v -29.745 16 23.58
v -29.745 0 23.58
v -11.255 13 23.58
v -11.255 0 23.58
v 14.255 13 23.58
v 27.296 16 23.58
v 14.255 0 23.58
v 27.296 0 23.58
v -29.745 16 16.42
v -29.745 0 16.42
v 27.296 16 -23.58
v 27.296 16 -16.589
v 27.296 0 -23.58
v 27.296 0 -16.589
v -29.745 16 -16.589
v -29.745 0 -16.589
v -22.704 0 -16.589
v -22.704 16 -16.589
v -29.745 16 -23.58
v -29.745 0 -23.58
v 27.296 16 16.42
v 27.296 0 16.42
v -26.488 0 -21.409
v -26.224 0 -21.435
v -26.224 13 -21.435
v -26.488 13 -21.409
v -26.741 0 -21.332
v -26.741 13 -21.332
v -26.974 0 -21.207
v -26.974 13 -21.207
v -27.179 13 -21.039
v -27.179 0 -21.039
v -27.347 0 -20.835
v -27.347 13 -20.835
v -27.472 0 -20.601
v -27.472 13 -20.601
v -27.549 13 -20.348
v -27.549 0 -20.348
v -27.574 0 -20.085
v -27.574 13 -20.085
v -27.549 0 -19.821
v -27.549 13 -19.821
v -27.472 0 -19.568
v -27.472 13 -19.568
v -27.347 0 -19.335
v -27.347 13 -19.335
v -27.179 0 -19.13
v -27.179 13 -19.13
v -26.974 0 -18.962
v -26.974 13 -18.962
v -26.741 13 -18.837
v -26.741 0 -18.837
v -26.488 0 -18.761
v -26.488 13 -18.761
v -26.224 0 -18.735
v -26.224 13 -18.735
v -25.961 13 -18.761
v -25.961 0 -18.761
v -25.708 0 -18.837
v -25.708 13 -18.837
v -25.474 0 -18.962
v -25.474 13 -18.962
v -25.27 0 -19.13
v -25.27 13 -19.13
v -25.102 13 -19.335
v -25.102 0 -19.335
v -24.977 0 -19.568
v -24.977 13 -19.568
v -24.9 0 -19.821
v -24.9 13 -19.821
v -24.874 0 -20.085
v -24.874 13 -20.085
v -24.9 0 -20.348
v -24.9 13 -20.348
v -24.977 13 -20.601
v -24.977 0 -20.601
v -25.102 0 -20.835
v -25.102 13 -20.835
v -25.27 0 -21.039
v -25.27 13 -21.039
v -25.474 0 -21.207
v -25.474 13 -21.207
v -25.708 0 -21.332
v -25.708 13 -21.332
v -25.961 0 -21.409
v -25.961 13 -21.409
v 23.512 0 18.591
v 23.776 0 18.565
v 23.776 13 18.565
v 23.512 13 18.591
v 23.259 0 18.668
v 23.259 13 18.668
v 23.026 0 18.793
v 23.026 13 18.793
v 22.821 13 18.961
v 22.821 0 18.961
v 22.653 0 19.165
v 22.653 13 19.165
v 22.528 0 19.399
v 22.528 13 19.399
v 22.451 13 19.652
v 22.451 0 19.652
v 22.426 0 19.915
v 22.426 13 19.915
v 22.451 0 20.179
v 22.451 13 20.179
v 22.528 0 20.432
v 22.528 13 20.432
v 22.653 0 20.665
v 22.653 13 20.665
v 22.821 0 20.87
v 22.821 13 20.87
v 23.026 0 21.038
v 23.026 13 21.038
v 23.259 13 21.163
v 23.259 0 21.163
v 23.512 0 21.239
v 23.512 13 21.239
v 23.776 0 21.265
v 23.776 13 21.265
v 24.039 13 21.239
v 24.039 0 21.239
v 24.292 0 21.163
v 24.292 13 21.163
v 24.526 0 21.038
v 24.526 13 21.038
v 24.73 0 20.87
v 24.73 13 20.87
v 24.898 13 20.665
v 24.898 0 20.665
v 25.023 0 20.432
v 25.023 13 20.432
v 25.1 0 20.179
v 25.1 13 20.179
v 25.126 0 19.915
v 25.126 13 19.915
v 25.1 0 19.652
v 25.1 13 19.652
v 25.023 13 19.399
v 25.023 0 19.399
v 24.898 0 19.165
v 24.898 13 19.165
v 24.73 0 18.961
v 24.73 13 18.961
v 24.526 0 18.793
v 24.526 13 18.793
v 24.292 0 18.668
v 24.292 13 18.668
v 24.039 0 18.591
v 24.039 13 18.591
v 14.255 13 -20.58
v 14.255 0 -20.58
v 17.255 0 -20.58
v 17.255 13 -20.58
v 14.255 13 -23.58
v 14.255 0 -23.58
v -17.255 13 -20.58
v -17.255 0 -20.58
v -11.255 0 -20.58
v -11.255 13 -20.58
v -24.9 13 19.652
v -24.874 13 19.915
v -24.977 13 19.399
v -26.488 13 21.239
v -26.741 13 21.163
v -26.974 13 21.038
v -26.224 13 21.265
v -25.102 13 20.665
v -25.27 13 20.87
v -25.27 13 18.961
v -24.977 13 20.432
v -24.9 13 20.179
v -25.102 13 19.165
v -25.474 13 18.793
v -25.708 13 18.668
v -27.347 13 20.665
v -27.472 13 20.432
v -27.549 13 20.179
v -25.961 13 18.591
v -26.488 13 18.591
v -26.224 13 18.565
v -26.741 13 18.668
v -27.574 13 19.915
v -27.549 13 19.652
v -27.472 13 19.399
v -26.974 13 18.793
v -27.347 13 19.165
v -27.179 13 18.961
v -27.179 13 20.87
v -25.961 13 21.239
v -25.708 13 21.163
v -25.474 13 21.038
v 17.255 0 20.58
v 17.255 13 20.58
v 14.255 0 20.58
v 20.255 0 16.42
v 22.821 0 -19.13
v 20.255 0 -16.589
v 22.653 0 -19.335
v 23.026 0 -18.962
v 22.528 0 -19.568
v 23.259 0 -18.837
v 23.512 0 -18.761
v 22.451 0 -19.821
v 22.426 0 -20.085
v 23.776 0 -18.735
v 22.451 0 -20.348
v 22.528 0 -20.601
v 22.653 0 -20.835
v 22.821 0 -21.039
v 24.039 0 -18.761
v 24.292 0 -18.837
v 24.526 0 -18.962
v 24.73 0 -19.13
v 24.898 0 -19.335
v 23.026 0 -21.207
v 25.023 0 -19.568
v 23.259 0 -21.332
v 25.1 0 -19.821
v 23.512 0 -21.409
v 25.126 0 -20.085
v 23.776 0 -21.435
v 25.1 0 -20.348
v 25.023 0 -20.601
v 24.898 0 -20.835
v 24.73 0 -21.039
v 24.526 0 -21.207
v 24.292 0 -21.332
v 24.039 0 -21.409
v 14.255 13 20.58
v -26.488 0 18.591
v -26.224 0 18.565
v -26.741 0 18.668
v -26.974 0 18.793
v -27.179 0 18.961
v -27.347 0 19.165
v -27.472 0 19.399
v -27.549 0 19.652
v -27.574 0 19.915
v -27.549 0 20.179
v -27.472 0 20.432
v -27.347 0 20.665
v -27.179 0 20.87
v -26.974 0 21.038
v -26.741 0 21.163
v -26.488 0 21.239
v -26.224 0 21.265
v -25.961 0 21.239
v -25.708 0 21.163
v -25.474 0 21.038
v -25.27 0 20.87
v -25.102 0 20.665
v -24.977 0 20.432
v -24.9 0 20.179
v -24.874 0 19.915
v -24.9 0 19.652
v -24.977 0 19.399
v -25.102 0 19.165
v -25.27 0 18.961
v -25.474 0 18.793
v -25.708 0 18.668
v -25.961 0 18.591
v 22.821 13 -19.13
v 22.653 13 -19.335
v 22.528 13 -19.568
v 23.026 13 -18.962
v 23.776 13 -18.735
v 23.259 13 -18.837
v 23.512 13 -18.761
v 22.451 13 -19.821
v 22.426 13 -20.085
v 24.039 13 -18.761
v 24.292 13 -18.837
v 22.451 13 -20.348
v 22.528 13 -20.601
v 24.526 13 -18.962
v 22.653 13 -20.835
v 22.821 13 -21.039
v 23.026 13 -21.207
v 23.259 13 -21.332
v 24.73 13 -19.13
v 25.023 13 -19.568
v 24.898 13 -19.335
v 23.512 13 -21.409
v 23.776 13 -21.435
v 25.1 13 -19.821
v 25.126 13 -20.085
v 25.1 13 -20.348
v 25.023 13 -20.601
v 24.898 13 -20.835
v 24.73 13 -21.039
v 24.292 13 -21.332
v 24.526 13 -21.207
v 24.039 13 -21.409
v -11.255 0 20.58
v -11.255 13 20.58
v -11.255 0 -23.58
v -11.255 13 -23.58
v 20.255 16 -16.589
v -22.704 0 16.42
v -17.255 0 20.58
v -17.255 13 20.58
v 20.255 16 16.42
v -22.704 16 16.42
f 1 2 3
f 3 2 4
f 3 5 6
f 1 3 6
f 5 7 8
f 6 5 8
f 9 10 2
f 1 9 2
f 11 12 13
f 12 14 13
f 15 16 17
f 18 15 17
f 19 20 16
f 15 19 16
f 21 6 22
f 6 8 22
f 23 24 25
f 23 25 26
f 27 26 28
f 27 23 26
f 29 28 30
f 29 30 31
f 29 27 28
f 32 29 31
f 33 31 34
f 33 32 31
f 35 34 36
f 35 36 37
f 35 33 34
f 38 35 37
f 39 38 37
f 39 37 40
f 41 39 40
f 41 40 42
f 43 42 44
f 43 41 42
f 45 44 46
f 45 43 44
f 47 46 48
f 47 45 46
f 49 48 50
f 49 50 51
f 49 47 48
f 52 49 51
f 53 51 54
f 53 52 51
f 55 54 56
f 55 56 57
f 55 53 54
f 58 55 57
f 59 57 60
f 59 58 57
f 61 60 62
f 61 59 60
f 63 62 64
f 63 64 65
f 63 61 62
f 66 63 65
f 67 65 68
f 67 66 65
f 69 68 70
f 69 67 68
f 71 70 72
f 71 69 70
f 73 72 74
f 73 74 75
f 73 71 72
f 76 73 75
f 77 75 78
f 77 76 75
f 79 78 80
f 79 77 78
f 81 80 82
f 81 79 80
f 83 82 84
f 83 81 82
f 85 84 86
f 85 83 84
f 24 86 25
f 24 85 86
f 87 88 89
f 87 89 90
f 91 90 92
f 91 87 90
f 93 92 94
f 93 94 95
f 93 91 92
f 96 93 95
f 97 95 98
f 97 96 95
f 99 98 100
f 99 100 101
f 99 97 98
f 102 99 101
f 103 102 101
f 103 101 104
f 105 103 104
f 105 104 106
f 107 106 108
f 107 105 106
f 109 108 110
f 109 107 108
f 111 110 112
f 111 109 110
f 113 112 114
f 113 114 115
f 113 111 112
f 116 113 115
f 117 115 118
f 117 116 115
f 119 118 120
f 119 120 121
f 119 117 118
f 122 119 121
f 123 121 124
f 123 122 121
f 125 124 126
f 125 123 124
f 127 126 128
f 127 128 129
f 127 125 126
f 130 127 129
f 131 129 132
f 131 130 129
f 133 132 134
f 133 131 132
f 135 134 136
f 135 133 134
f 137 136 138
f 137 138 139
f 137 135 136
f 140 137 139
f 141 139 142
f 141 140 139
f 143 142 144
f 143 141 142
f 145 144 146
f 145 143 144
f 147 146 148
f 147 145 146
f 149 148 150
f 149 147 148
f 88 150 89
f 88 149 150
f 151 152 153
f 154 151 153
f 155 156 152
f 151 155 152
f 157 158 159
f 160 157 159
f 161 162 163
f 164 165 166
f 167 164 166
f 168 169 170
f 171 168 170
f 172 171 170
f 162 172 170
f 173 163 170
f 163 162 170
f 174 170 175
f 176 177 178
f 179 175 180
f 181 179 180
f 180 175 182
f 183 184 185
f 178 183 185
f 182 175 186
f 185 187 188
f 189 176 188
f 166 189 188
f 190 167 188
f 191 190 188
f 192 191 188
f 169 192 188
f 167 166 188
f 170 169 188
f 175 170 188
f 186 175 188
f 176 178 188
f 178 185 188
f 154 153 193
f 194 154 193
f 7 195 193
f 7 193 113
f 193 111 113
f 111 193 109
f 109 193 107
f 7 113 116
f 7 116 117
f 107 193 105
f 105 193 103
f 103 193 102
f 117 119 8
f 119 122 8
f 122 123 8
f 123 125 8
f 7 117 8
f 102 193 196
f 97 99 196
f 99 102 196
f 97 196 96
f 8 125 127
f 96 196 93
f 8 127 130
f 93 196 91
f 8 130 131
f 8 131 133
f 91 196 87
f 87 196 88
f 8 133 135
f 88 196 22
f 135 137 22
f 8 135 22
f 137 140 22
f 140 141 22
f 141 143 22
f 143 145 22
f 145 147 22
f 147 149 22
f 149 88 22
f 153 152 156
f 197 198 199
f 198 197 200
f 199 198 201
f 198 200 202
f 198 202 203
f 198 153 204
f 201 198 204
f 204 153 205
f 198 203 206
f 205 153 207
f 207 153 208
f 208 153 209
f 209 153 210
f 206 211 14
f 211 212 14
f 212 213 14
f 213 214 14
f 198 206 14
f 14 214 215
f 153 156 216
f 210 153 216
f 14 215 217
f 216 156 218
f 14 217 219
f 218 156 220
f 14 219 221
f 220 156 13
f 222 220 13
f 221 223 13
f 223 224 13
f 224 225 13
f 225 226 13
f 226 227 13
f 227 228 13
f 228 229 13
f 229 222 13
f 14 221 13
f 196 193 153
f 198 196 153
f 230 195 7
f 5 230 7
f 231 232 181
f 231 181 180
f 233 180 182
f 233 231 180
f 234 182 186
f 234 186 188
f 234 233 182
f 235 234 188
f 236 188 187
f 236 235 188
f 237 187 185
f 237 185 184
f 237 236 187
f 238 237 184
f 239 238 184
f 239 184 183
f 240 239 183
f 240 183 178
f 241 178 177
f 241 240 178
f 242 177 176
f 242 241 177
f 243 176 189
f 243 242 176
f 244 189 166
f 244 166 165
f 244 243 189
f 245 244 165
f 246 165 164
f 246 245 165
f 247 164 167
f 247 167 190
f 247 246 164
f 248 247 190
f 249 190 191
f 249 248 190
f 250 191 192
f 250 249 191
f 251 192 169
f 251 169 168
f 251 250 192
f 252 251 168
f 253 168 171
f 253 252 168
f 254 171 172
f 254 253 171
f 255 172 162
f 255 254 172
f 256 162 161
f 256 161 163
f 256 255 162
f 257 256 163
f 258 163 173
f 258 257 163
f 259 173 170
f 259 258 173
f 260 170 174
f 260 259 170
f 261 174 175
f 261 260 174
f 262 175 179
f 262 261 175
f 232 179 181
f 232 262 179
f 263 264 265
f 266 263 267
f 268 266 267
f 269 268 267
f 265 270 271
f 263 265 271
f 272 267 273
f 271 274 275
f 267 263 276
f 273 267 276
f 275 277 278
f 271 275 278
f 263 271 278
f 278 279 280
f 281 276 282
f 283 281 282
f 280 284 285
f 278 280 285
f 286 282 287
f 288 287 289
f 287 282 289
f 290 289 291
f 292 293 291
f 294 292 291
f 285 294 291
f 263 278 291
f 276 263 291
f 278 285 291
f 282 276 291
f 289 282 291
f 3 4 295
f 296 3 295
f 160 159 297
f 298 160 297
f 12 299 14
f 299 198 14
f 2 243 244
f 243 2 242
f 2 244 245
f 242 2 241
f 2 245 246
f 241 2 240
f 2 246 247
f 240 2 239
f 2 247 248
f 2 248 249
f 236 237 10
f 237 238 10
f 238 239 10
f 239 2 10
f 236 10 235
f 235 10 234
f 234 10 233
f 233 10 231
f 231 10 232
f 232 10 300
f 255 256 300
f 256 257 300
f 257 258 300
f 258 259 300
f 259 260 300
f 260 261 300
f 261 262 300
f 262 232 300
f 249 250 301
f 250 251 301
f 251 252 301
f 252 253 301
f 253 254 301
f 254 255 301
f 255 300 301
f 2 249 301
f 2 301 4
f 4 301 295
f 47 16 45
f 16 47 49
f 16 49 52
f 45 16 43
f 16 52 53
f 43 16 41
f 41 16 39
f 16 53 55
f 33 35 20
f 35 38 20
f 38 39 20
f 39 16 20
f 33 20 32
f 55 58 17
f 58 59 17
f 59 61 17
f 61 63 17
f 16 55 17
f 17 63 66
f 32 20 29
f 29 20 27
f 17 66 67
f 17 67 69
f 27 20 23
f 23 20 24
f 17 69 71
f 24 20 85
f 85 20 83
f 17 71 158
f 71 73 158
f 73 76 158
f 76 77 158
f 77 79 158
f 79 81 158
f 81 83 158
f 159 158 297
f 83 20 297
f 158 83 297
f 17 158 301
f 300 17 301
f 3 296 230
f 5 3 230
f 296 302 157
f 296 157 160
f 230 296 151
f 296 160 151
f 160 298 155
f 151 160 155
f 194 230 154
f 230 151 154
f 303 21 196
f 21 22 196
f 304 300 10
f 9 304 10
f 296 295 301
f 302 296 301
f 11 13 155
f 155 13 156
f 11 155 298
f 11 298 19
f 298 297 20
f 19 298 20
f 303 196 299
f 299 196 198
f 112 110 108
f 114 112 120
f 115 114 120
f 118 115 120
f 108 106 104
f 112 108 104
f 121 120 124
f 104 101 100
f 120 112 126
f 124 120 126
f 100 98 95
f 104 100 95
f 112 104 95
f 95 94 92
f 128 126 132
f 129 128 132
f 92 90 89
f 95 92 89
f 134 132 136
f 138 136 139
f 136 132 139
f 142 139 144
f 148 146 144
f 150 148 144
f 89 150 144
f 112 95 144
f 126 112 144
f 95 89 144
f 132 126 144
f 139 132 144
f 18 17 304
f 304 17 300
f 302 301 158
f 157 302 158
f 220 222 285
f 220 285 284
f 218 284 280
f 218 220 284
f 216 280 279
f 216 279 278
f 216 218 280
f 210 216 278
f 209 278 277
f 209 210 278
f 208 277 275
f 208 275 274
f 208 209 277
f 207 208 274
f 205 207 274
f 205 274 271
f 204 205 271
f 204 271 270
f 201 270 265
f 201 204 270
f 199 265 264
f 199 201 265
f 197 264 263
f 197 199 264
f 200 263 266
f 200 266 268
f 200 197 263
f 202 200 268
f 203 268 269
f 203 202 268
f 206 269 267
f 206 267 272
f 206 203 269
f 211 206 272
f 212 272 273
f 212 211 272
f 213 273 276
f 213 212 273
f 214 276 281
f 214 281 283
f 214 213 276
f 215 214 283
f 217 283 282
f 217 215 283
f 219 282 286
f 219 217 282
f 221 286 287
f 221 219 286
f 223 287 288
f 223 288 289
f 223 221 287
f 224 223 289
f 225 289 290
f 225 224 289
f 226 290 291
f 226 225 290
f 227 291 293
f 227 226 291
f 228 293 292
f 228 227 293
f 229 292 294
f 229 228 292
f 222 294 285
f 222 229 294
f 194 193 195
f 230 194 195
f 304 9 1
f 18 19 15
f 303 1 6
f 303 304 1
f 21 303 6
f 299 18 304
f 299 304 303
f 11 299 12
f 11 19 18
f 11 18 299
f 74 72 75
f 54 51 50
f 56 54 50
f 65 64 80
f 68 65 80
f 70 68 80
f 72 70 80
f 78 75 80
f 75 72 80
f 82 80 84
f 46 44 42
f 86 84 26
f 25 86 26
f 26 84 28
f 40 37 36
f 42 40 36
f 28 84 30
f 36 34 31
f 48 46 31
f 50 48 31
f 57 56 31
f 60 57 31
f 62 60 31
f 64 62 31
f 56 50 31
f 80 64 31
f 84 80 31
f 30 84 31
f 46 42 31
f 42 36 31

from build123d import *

# Parameters (mm, degrees)
SKETCH1_R             = 1.35
BOSS_EXTRUDE2_DEPTH   = 13
BOSS_EXTRUDE2_2_DEPTH = 13
SKETCH4_R             = 1.35
BOSS_EXTRUDE5_DEPTH   = 3


with BuildPart() as part:
    # Sketch1 → Boss-Extrude2 (new body)
    with BuildSketch(Plane(origin=(0, 0, 0), x_dir=(1, 0, 0), z_dir=(0, 1, 0))):
        Polygon((-11.255, 23.58), (-29.745, 23.58), (-29.745, 16.589209278), (-22.7039371, 16.589209278), (-22.7039371, -16.42), (-29.745, -16.42), (-29.745, -23.58), (-11.255, -23.58), (-11.255, -20.58), (-17.255, -20.58), (-17.255, 20.58), (-11.255, 20.58), align=None)
        with Locations(Location((-26.22446855, 20.084604639, 0), (0, 0, 90))):
            Circle(SKETCH1_R, mode=Mode.SUBTRACT)
        with Locations(Location((-26.22446855, -19.915395361, 0), (0, 0, 90))):
            Circle(SKETCH1_R, mode=Mode.SUBTRACT)
    extrude(amount=BOSS_EXTRUDE2_DEPTH)



with BuildPart() as body_2:
    # Sketch1 → Boss-Extrude2 2 (new body)
    with BuildSketch(Plane(origin=(0, 0, 0), x_dir=(1, 0, 0), z_dir=(0, 1, 0))):
        Polygon((14.255, 23.58), (14.255, 20.58), (17.255, 20.58), (17.255, -20.58), (14.255, -20.58), (14.255, -23.58), (27.2960629, -23.58), (27.2960629, -16.42), (20.255, -16.42), (20.255, 16.589209278), (27.2960629, 16.589209278), (27.2960629, 23.58), align=None)
        with Locations(Location((23.77553145, 20.084604639, 0), (0, 0, 90))):
            Circle(SKETCH1_R, mode=Mode.SUBTRACT)
        with Locations(Location((23.77553145, -19.915395361, 0), (0, 0, 90))):
            Circle(SKETCH1_R, mode=Mode.SUBTRACT)
    extrude(amount=BOSS_EXTRUDE2_2_DEPTH)


with BuildPart() as part_1:
    add(part.part)

    add(body_2.part)  # Boss-Extrude5 merges body 2
    # Sketch4 → Boss-Extrude5 (add)
    # profile 1 of 4: a face of its own
    with BuildSketch(Plane(origin=(0, 13, 0), x_dir=(1, 0, 0), z_dir=(0, 1, 0))):
        Polygon((-29.745, -23.58), (-11.255, -23.58), (-11.255, -20.58), (-17.255, -20.58), (-17.255, 20.58), (-11.255, 20.58), (-11.255, 23.58), (-29.745, 23.58), (-29.745, 16.589209278), (-22.7039371, 16.589209278), (-22.7039371, -16.42), (-29.745, -16.42), align=None)
        with Locations(Location((-26.22446855, -19.915395361, 0), (0, 0, 90))):
            Circle(SKETCH4_R, mode=Mode.SUBTRACT)
        with Locations(Location((-26.22446855, 20.084604639, 0), (0, 0, 90))):
            Circle(SKETCH4_R, mode=Mode.SUBTRACT)
    # profile 2 of 4: a face of its own
    with BuildSketch(Plane(origin=(0, 13, 0), x_dir=(1, 0, 0), z_dir=(0, 1, 0))):
        Polygon((27.2960629, 23.58), (-11.255, 23.58), (-11.255, 20.58), (-17.255, 20.58), (-17.255, -20.58), (-11.255, -20.58), (-11.255, -23.58), (27.2960629, -23.58), (27.2960629, -16.42), (20.255, -16.42), (20.255, 16.589209278), (27.2960629, 16.589209278), align=None)
    # profile 3 of 4: a face of its own
    with BuildSketch(Plane(origin=(0, 13, 0), x_dir=(1, 0, 0), z_dir=(0, 1, 0))):
        with Locations(Location((-26.22446855, 20.084604639, 0), (0, 0, 90))):
            Circle(SKETCH4_R)
    # profile 4 of 4: a face of its own
    with BuildSketch(Plane(origin=(0, 13, 0), x_dir=(1, 0, 0), z_dir=(0, 1, 0))):
        with Locations(Location((-26.22446855, -19.915395361, 0), (0, 0, 90))):
            Circle(SKETCH4_R)
    extrude(amount=BOSS_EXTRUDE5_DEPTH)


solid = part_1.part
